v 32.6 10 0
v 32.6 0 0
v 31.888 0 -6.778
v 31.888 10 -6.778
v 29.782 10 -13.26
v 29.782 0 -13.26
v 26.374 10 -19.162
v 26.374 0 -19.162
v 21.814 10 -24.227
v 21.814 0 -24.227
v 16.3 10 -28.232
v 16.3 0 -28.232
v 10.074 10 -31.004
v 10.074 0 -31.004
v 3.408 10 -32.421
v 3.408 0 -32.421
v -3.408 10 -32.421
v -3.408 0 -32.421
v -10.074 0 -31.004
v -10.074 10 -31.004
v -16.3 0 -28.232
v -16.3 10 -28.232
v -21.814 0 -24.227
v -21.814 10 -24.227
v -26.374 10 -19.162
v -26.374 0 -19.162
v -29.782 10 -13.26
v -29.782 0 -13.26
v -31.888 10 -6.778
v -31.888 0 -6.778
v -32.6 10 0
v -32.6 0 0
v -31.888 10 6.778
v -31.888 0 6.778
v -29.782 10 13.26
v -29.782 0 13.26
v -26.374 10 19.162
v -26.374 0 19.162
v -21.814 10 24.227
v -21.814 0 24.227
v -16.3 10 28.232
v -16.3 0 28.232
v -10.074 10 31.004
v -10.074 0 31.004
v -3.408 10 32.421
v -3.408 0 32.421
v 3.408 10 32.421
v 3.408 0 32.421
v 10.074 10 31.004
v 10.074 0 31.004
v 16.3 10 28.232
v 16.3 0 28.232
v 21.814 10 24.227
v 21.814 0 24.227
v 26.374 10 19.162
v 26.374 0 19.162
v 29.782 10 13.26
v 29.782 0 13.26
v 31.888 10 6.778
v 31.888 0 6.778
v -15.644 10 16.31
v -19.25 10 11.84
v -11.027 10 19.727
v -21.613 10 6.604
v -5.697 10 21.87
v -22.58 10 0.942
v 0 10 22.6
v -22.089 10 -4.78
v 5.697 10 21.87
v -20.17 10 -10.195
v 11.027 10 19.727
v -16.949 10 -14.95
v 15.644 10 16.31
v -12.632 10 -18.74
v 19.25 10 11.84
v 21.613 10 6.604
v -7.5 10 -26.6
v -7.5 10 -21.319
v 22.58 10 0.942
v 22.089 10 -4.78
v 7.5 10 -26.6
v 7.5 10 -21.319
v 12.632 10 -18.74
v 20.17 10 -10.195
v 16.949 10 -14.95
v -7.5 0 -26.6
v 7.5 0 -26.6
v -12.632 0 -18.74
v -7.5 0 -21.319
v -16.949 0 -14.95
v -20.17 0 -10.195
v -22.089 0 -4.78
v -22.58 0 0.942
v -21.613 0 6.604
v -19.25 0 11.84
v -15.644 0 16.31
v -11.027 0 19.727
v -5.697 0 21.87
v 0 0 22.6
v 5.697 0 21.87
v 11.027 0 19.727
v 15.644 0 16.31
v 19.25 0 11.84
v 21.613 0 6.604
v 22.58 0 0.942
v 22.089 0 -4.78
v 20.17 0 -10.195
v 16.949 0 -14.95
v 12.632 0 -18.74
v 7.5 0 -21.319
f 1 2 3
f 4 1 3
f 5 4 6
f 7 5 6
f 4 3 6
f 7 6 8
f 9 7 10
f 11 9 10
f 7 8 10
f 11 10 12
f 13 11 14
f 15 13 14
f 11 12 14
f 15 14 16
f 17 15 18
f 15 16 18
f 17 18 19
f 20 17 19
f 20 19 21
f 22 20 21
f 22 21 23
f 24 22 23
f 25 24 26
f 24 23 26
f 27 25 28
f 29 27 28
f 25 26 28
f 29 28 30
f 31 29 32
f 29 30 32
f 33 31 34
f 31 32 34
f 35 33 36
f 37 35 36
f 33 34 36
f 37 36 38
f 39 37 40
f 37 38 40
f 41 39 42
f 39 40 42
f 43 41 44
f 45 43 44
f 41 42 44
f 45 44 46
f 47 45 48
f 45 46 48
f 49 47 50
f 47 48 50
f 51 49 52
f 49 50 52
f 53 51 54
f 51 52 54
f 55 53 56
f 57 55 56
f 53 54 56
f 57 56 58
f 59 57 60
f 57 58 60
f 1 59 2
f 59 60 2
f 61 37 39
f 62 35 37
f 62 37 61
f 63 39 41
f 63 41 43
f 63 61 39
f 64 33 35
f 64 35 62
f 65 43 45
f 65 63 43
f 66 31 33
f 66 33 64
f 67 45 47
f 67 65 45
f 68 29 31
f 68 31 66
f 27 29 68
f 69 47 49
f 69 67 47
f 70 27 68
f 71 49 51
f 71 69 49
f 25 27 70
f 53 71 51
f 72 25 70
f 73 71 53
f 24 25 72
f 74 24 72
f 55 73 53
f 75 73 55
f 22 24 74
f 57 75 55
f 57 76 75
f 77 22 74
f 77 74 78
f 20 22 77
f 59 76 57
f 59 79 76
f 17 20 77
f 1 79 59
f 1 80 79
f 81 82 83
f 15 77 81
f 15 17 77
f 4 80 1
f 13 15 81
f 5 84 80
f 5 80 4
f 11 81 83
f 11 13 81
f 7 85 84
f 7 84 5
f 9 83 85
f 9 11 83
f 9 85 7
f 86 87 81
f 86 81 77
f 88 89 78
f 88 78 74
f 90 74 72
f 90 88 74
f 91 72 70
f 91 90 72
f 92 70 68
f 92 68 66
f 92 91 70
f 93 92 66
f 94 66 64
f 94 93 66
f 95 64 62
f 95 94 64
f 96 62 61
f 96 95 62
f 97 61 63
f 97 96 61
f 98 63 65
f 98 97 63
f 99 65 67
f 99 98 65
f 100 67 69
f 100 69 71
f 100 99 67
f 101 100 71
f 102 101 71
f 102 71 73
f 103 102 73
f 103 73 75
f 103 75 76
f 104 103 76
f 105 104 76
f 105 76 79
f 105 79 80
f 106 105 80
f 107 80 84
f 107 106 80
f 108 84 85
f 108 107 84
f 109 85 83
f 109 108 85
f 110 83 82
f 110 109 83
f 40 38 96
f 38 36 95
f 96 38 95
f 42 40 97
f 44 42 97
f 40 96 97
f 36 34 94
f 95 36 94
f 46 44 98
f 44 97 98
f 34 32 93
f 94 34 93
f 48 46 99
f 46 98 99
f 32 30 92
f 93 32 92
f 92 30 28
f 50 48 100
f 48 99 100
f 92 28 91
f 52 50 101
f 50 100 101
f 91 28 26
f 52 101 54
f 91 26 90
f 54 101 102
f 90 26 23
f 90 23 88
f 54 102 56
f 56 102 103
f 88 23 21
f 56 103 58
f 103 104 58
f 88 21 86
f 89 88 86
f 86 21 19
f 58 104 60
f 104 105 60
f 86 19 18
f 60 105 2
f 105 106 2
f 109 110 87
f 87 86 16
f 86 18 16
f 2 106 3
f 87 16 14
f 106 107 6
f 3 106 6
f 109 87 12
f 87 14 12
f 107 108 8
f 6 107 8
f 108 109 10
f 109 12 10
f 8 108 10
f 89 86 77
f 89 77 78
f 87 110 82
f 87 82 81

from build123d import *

# Parameters (mm, degrees)
SKETCH1_R      = 32.6
EXTRUDE1_DEPTH = 10


with BuildPart() as part:
    # Sketch1 → Extrude1 (new body)
    with BuildSketch(Plane(origin=(0, 0, 0), x_dir=(1, 0, 0), z_dir=(0, 1, 0))):
        Circle(SKETCH1_R)
        with BuildLine():
            Line((-7.5, 26.6), (-7.5, 21.319240137))
            ThreePointArc((-7.5, 21.319240137), (0, -22.6), (7.5, 21.319240137))
            Line((7.5, 21.319240137), (7.5, 26.6))
            Line((7.5, 26.6), (-7.5, 26.6))
        make_face(mode=Mode.SUBTRACT)
    extrude(amount=EXTRUDE1_DEPTH)


solid = part.part
